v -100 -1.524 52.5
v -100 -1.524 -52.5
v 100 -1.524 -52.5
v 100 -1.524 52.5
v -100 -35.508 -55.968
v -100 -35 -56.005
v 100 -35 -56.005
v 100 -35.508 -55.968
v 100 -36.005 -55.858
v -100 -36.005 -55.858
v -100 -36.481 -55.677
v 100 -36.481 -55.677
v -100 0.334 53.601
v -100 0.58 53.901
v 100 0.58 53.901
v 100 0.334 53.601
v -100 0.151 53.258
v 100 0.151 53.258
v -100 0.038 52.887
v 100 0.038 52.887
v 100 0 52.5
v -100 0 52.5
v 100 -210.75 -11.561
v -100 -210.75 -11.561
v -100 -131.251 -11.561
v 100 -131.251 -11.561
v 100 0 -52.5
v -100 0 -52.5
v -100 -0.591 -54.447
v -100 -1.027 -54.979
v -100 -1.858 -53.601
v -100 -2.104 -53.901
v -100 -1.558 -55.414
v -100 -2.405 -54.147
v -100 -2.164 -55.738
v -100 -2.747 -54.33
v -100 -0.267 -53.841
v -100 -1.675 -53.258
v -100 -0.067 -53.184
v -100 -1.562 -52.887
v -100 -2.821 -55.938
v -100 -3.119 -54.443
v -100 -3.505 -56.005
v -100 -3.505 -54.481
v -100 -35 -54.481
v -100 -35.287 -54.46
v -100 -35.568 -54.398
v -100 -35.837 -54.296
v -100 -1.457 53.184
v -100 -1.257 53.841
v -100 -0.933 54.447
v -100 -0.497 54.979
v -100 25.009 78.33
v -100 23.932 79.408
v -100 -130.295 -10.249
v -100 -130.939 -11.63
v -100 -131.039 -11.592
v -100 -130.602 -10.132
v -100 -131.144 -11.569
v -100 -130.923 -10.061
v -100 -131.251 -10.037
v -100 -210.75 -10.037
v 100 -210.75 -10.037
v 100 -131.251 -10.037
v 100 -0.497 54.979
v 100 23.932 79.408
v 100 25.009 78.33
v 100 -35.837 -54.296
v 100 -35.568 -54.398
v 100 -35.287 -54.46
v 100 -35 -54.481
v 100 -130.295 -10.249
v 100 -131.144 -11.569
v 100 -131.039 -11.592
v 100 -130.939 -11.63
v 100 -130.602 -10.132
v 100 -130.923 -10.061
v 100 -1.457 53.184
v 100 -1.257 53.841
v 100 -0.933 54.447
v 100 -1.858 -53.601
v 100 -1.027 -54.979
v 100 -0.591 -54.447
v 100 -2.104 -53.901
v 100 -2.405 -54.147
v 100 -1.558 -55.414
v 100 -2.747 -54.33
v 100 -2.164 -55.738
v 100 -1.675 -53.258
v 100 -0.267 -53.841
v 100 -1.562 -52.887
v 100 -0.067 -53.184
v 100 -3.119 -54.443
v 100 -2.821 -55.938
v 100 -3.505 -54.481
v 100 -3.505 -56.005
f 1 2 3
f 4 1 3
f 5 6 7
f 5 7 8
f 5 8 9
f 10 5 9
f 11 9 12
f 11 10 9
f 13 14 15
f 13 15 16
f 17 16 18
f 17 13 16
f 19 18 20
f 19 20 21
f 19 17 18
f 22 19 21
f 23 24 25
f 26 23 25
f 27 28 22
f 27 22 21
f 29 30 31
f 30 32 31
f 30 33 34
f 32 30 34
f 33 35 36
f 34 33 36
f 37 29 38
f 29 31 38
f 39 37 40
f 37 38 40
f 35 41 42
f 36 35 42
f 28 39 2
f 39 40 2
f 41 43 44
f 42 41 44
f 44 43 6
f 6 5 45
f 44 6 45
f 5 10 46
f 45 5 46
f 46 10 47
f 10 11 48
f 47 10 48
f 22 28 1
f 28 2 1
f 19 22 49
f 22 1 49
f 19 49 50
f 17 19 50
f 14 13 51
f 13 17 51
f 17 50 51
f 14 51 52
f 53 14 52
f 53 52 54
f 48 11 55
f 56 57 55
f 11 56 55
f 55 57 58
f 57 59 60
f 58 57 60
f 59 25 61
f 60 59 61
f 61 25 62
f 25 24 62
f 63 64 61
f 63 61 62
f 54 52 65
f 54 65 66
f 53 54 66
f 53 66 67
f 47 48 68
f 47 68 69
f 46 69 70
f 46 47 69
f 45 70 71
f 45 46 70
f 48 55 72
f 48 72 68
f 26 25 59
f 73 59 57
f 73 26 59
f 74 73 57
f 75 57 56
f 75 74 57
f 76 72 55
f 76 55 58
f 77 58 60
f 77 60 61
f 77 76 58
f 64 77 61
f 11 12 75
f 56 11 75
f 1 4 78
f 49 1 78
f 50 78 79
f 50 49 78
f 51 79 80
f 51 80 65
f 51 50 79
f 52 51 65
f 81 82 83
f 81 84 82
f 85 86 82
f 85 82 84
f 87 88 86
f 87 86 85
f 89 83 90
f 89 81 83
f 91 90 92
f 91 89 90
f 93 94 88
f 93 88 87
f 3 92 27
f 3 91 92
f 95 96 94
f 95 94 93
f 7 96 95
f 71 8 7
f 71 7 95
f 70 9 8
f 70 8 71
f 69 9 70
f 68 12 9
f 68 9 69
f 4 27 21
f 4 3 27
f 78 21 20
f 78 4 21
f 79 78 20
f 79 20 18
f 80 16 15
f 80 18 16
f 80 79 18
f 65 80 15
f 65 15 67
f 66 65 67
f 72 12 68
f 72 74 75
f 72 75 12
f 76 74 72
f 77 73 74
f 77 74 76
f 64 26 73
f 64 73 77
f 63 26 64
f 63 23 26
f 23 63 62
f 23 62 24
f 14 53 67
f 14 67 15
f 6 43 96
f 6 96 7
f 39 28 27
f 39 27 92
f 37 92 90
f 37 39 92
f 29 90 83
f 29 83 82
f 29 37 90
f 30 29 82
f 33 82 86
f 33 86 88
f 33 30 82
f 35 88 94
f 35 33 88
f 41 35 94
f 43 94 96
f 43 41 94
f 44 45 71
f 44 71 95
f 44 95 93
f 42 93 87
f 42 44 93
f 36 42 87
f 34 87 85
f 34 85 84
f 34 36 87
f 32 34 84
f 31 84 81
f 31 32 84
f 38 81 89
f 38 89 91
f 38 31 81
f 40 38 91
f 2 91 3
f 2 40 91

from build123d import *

# Parameters (mm, degrees)
SKETCH1_W          = 200
SKETCH1_H          = 105
BASE_FLANGE1_DEPTH = 1.524
EDGE_FLANGE1_DEPTH = 200
EDGE_FLANGE2_DEPTH = 200
EDGE_FLANGE3_DEPTH = 200
EDGE_FLANGE4_DEPTH = 200


# Sheet-metal steps are written as plain solids
with BuildPart() as part:
    # Sketch1 → Base-Flange1 (new body)
    with BuildSketch(Plane(origin=(0, 0, 0), x_dir=(1, 0, 0), z_dir=(0, 1, 0))):
        Rectangle(SKETCH1_W, SKETCH1_H)
    extrude(amount=-BASE_FLANGE1_DEPTH)

    # Edge-Flange1 section (across the edge) → Edge-Flange1 (add)
    with BuildSketch(Plane(origin=(-100, 0, 53.32063991), x_dir=(0, 0.7071067811865512, -0.7071067811865438), z_dir=(1, 0, 0))):
        with BuildLine():
            Line((-1.524, 0.82063991), (-1.524, 35.368738531))
            Line((-1.524, 35.368738531), (0, 35.368738531))
            Line((0, 35.368738531), (0, 0.82063991))
            ThreePointArc((0, 0.82063991), (0.15080987, 0.062467494), (0.580280045, -0.580280045))
            Line((0.580280045, -0.580280045), (-0.497350689, -1.65791078))
            ThreePointArc((-0.497350689, -1.65791078), (-1.257182537, -0.520742057), (-1.524, 0.82063991))
        make_face()
    extrude(amount=EDGE_FLANGE1_DEPTH)

    # Edge-Flange2 section (across the edge) → Edge-Flange2 (add)
    with BuildSketch(Plane(origin=(-100, -1.524, -54.4812), x_dir=(0, 0, 1), z_dir=(1, 0, 0))):
        with BuildLine():
            Line((-1.524, 1.9812), (-1.524, 33.476))
            Line((-1.524, 33.476), (0, 33.476))
            Line((0, 33.476), (0, 1.9812))
            ThreePointArc((0, 1.9812), (0.580280045, 0.580280045), (1.9812, 0))
            Line((1.9812, 0), (1.9812, -1.524))
            ThreePointArc((1.9812, -1.524), (-0.497350689, -0.497350689), (-1.524, 1.9812))
        make_face()
    extrude(amount=EDGE_FLANGE2_DEPTH)

    # Edge-Flange3 section (across the edge) → Edge-Flange3 (add)
    with BuildSketch(Plane(origin=(-100, -35.439221466, -54.4812), x_dir=(0, 0.4226182617406906, 0.906307787036654), z_dir=(1, 0, 0))):
        with BuildLine():
            Line((-1.524, 0.439221466), (-1.524, 104.662137334))
            Line((-1.524, 104.662137334), (0, 104.662137334))
            Line((0, 104.662137334), (0, 0.439221466))
            ThreePointArc((0, 0.439221466), (0.046962351, 0.010411302), (0.185623012, -0.398069835))
            Line((0.185623012, -0.398069835), (-1.195590055, -1.042140065))
            ThreePointArc((-1.195590055, -1.042140065), (-1.440912764, -0.319442669), (-1.524, 0.439221466))
        make_face()
    extrude(amount=EDGE_FLANGE3_DEPTH)

    # Edge-Flange4 section (across the edge) → Edge-Flange4 (add)
    with BuildSketch(Plane(origin=(100, -131.087402093, -11.561268833), x_dir=(0, 0, -1), z_dir=(-1, 0, 0))):
        with BuildLine():
            Line((-1.524, 0.163300289), (-1.524, 79.662137334))
            Line((-1.524, 79.662137334), (0, 79.662137334))
            Line((0, 79.662137334), (0, 0.163300289))
            ThreePointArc((0, 0.163300289), (0.017460361, 0.003870869), (0.069013684, -0.148000323))
            Line((0.069013684, -0.148000323), (-1.312199383, -0.792070554))
            ThreePointArc((-1.312199383, -0.792070554), (-1.470414754, -0.325983103), (-1.524, 0.163300289))
        make_face()
    extrude(amount=EDGE_FLANGE4_DEPTH)


solid = part.part
